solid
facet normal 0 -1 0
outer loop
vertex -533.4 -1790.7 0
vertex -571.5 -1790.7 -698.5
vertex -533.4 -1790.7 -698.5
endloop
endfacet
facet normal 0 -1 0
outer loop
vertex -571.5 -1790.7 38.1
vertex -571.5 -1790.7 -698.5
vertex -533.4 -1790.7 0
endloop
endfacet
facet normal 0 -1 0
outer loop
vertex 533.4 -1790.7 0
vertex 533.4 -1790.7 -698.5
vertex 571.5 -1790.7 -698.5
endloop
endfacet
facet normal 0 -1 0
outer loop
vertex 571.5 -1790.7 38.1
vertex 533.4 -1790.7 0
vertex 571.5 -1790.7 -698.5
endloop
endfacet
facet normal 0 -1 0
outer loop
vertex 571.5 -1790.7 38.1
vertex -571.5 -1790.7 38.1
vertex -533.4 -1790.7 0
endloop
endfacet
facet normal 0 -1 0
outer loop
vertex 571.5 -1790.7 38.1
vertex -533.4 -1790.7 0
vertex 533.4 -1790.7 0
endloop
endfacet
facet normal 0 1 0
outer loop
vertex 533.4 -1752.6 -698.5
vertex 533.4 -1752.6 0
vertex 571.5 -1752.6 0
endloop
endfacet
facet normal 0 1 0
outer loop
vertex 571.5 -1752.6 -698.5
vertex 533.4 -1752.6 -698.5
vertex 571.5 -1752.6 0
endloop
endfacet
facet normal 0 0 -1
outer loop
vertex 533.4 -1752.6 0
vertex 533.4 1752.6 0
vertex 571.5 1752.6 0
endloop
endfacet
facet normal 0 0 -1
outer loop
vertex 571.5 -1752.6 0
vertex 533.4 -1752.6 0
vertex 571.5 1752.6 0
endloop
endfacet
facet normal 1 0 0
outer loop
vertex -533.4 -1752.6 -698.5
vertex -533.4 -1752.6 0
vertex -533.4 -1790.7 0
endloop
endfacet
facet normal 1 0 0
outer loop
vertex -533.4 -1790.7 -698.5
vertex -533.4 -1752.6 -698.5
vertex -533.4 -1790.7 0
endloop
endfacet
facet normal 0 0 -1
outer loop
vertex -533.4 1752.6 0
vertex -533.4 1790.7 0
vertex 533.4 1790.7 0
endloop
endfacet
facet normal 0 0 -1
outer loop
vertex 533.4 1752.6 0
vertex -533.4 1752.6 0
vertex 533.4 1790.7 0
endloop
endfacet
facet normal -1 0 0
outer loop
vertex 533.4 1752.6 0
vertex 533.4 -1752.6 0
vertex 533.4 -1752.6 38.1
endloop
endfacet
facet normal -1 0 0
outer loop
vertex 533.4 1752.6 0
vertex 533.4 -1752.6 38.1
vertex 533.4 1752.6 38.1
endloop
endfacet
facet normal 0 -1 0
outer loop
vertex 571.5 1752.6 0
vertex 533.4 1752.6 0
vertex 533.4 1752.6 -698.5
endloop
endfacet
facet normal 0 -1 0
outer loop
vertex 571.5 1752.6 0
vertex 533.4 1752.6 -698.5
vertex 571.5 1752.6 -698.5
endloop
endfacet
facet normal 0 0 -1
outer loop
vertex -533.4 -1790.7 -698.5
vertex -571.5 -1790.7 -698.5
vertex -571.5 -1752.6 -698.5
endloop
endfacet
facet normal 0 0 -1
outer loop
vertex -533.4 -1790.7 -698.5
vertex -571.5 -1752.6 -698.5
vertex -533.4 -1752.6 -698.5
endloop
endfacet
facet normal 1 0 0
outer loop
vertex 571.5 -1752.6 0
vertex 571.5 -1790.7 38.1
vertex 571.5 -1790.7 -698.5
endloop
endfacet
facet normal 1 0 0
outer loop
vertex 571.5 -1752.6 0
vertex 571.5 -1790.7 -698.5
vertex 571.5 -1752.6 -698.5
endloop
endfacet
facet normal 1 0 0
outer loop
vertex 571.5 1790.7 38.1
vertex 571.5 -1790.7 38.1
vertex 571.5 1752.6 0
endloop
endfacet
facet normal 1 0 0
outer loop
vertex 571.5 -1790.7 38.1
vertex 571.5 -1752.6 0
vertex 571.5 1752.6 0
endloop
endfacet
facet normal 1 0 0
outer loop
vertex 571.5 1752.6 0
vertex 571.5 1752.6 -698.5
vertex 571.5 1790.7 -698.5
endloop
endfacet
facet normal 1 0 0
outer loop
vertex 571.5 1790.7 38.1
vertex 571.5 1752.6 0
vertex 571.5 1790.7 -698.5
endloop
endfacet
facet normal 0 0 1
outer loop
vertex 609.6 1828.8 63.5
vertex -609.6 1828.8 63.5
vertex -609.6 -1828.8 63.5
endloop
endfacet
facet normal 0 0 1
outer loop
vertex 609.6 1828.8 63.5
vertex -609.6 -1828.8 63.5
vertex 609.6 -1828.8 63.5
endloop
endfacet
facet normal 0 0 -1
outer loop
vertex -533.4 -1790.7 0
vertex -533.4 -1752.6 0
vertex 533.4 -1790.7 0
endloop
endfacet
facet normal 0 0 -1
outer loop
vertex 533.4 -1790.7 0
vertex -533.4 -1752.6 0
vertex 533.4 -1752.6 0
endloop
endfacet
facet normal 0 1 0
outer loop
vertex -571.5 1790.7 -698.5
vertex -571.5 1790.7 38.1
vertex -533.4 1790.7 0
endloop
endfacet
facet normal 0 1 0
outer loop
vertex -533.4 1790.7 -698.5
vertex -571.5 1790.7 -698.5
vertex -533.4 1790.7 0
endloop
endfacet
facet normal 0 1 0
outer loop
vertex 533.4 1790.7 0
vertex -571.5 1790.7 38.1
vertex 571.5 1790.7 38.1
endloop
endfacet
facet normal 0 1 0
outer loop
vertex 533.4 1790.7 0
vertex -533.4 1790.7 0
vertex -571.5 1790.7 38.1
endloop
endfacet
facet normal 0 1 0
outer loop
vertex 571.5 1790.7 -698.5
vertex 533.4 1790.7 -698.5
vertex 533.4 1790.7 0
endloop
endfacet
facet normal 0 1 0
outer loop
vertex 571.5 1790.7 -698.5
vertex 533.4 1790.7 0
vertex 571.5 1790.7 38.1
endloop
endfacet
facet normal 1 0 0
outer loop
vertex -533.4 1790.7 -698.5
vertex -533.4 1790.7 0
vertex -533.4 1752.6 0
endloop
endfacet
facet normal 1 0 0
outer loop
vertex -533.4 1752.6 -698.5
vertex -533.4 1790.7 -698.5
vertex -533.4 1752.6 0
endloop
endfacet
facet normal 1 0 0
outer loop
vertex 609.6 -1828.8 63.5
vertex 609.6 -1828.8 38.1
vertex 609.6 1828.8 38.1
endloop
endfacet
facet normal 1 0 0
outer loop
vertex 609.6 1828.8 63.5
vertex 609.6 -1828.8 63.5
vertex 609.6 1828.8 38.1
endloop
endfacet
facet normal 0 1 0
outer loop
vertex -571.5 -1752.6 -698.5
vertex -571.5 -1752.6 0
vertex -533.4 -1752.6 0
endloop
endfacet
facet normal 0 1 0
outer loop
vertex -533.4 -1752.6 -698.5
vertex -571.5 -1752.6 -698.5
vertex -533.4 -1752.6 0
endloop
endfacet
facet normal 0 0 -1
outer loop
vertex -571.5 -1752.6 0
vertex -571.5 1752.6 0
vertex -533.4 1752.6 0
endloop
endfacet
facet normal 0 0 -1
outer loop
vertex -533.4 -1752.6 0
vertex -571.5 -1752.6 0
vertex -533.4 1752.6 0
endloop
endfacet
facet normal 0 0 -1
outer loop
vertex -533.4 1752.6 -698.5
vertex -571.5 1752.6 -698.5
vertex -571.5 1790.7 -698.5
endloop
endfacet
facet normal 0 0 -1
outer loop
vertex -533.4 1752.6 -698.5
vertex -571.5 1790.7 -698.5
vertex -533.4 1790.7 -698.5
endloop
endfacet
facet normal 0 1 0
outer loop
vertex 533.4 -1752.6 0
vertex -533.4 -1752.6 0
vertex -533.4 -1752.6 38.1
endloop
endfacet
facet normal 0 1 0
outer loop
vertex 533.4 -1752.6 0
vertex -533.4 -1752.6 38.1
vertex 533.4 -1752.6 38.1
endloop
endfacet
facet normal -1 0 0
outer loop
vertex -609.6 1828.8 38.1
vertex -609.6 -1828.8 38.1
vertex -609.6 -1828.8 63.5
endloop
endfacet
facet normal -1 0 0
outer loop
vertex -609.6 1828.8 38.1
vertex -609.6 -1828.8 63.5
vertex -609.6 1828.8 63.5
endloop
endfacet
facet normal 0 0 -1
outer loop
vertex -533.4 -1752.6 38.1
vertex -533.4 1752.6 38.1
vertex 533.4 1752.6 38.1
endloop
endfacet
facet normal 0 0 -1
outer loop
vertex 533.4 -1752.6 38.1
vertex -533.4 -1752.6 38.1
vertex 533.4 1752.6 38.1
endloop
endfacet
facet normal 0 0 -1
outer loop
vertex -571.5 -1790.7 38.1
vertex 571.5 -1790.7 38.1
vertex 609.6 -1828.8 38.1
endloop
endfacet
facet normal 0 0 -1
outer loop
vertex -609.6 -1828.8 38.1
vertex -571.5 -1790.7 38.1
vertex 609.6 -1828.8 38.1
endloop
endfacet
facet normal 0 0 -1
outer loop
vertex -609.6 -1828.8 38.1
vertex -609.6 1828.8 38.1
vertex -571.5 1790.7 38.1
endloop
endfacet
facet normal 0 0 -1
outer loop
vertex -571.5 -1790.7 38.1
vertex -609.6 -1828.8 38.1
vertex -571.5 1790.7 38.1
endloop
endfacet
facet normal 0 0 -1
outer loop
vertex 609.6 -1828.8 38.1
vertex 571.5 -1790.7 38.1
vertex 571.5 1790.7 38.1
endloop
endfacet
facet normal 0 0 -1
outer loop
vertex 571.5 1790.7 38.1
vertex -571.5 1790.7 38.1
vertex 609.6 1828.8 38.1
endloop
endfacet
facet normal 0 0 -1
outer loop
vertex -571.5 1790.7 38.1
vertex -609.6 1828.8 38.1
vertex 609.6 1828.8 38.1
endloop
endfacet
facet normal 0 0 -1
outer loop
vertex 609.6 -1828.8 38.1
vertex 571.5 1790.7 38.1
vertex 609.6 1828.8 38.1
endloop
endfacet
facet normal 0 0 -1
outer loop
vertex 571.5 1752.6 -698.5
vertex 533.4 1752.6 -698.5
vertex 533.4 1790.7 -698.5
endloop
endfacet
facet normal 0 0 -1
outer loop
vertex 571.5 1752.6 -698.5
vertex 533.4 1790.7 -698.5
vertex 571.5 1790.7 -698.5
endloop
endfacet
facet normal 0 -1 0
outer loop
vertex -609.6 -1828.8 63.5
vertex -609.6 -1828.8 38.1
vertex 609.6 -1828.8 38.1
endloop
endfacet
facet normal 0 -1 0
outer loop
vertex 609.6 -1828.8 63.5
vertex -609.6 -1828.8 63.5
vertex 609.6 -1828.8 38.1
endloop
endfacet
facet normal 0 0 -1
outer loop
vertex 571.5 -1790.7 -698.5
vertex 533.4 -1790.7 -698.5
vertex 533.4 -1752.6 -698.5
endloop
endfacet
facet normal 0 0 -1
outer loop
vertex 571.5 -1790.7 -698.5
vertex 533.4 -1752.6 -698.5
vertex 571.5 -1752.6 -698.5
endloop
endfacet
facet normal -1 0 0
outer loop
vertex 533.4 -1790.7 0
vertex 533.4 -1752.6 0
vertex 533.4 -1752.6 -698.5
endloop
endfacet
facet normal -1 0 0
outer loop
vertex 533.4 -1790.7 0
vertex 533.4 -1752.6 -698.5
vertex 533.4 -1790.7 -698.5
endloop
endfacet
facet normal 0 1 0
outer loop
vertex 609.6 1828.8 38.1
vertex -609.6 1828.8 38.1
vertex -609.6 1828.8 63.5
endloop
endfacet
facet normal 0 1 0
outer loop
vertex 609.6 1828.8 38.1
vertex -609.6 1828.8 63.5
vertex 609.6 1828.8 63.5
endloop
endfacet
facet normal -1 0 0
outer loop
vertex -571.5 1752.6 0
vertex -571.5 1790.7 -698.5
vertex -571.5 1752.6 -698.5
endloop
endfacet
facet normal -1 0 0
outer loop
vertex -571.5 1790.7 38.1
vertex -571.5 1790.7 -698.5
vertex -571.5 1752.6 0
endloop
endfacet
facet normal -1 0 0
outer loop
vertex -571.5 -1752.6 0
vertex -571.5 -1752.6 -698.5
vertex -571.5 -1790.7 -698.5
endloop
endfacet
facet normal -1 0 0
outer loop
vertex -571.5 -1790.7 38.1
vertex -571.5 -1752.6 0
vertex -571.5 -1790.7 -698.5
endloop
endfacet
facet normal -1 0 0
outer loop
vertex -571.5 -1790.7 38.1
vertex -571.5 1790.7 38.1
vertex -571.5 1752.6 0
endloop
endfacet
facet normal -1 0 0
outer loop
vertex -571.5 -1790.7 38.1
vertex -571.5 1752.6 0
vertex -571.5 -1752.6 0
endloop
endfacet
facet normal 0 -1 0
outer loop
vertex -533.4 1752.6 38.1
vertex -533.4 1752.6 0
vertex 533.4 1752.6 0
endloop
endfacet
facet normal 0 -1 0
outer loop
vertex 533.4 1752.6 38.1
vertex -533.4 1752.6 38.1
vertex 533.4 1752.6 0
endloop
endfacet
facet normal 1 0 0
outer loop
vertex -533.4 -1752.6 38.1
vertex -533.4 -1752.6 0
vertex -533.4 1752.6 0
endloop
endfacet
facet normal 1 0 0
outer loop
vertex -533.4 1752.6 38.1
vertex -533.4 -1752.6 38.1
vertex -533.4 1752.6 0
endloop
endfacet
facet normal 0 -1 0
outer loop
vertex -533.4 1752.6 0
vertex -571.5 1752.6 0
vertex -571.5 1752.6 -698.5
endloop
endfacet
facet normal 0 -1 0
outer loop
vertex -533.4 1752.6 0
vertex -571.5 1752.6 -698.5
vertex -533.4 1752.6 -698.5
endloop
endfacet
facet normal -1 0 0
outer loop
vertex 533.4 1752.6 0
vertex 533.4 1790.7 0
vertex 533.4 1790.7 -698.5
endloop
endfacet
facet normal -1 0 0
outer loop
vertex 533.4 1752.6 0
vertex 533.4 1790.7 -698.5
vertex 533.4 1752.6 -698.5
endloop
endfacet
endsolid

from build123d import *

# Parameters (mm, degrees)
F0_W     = 1143
F0_H     = 3581.4
F0_W_2   = 1066.8
F0_H_2   = 3505.2
F1_DEPTH = 38.1
F2_W     = 38.1
F2_H     = 38.1
F3_DEPTH = 698.5
F4_W     = 1219.2
F4_H     = 3657.6
F5_DEPTH = 25.4


with BuildPart() as f1:
    # F0 (on Top) → F1 (new body)
    with BuildSketch(Plane.XY):
        Rectangle(F0_W, F0_H)
        Rectangle(F0_W_2, F0_H_2, mode=Mode.SUBTRACT)
    extrude(amount=F1_DEPTH)

    # F2 (on face) → F3 (join)
    with BuildSketch(Plane(origin=(0, 0, 0), x_dir=(1, 0, 0), z_dir=(0, 0, -1))):
        with Locations((-552.45, 1771.65)):
            Rectangle(F2_W, F2_H)
        with Locations((552.45, 1771.65)):
            Rectangle(F2_W, F2_H)
        with Locations((-552.45, -1771.65)):
            Rectangle(F2_W, F2_H)
        with Locations((552.45, -1771.65)):
            Rectangle(F2_W, F2_H)
    extrude(amount=F3_DEPTH)

    # F4 (on face) → F5 (join)
    with BuildSketch(Plane.XY.offset(38.1)):
        Rectangle(F4_W, F4_H)
    extrude(amount=F5_DEPTH)


solid = f1.part
